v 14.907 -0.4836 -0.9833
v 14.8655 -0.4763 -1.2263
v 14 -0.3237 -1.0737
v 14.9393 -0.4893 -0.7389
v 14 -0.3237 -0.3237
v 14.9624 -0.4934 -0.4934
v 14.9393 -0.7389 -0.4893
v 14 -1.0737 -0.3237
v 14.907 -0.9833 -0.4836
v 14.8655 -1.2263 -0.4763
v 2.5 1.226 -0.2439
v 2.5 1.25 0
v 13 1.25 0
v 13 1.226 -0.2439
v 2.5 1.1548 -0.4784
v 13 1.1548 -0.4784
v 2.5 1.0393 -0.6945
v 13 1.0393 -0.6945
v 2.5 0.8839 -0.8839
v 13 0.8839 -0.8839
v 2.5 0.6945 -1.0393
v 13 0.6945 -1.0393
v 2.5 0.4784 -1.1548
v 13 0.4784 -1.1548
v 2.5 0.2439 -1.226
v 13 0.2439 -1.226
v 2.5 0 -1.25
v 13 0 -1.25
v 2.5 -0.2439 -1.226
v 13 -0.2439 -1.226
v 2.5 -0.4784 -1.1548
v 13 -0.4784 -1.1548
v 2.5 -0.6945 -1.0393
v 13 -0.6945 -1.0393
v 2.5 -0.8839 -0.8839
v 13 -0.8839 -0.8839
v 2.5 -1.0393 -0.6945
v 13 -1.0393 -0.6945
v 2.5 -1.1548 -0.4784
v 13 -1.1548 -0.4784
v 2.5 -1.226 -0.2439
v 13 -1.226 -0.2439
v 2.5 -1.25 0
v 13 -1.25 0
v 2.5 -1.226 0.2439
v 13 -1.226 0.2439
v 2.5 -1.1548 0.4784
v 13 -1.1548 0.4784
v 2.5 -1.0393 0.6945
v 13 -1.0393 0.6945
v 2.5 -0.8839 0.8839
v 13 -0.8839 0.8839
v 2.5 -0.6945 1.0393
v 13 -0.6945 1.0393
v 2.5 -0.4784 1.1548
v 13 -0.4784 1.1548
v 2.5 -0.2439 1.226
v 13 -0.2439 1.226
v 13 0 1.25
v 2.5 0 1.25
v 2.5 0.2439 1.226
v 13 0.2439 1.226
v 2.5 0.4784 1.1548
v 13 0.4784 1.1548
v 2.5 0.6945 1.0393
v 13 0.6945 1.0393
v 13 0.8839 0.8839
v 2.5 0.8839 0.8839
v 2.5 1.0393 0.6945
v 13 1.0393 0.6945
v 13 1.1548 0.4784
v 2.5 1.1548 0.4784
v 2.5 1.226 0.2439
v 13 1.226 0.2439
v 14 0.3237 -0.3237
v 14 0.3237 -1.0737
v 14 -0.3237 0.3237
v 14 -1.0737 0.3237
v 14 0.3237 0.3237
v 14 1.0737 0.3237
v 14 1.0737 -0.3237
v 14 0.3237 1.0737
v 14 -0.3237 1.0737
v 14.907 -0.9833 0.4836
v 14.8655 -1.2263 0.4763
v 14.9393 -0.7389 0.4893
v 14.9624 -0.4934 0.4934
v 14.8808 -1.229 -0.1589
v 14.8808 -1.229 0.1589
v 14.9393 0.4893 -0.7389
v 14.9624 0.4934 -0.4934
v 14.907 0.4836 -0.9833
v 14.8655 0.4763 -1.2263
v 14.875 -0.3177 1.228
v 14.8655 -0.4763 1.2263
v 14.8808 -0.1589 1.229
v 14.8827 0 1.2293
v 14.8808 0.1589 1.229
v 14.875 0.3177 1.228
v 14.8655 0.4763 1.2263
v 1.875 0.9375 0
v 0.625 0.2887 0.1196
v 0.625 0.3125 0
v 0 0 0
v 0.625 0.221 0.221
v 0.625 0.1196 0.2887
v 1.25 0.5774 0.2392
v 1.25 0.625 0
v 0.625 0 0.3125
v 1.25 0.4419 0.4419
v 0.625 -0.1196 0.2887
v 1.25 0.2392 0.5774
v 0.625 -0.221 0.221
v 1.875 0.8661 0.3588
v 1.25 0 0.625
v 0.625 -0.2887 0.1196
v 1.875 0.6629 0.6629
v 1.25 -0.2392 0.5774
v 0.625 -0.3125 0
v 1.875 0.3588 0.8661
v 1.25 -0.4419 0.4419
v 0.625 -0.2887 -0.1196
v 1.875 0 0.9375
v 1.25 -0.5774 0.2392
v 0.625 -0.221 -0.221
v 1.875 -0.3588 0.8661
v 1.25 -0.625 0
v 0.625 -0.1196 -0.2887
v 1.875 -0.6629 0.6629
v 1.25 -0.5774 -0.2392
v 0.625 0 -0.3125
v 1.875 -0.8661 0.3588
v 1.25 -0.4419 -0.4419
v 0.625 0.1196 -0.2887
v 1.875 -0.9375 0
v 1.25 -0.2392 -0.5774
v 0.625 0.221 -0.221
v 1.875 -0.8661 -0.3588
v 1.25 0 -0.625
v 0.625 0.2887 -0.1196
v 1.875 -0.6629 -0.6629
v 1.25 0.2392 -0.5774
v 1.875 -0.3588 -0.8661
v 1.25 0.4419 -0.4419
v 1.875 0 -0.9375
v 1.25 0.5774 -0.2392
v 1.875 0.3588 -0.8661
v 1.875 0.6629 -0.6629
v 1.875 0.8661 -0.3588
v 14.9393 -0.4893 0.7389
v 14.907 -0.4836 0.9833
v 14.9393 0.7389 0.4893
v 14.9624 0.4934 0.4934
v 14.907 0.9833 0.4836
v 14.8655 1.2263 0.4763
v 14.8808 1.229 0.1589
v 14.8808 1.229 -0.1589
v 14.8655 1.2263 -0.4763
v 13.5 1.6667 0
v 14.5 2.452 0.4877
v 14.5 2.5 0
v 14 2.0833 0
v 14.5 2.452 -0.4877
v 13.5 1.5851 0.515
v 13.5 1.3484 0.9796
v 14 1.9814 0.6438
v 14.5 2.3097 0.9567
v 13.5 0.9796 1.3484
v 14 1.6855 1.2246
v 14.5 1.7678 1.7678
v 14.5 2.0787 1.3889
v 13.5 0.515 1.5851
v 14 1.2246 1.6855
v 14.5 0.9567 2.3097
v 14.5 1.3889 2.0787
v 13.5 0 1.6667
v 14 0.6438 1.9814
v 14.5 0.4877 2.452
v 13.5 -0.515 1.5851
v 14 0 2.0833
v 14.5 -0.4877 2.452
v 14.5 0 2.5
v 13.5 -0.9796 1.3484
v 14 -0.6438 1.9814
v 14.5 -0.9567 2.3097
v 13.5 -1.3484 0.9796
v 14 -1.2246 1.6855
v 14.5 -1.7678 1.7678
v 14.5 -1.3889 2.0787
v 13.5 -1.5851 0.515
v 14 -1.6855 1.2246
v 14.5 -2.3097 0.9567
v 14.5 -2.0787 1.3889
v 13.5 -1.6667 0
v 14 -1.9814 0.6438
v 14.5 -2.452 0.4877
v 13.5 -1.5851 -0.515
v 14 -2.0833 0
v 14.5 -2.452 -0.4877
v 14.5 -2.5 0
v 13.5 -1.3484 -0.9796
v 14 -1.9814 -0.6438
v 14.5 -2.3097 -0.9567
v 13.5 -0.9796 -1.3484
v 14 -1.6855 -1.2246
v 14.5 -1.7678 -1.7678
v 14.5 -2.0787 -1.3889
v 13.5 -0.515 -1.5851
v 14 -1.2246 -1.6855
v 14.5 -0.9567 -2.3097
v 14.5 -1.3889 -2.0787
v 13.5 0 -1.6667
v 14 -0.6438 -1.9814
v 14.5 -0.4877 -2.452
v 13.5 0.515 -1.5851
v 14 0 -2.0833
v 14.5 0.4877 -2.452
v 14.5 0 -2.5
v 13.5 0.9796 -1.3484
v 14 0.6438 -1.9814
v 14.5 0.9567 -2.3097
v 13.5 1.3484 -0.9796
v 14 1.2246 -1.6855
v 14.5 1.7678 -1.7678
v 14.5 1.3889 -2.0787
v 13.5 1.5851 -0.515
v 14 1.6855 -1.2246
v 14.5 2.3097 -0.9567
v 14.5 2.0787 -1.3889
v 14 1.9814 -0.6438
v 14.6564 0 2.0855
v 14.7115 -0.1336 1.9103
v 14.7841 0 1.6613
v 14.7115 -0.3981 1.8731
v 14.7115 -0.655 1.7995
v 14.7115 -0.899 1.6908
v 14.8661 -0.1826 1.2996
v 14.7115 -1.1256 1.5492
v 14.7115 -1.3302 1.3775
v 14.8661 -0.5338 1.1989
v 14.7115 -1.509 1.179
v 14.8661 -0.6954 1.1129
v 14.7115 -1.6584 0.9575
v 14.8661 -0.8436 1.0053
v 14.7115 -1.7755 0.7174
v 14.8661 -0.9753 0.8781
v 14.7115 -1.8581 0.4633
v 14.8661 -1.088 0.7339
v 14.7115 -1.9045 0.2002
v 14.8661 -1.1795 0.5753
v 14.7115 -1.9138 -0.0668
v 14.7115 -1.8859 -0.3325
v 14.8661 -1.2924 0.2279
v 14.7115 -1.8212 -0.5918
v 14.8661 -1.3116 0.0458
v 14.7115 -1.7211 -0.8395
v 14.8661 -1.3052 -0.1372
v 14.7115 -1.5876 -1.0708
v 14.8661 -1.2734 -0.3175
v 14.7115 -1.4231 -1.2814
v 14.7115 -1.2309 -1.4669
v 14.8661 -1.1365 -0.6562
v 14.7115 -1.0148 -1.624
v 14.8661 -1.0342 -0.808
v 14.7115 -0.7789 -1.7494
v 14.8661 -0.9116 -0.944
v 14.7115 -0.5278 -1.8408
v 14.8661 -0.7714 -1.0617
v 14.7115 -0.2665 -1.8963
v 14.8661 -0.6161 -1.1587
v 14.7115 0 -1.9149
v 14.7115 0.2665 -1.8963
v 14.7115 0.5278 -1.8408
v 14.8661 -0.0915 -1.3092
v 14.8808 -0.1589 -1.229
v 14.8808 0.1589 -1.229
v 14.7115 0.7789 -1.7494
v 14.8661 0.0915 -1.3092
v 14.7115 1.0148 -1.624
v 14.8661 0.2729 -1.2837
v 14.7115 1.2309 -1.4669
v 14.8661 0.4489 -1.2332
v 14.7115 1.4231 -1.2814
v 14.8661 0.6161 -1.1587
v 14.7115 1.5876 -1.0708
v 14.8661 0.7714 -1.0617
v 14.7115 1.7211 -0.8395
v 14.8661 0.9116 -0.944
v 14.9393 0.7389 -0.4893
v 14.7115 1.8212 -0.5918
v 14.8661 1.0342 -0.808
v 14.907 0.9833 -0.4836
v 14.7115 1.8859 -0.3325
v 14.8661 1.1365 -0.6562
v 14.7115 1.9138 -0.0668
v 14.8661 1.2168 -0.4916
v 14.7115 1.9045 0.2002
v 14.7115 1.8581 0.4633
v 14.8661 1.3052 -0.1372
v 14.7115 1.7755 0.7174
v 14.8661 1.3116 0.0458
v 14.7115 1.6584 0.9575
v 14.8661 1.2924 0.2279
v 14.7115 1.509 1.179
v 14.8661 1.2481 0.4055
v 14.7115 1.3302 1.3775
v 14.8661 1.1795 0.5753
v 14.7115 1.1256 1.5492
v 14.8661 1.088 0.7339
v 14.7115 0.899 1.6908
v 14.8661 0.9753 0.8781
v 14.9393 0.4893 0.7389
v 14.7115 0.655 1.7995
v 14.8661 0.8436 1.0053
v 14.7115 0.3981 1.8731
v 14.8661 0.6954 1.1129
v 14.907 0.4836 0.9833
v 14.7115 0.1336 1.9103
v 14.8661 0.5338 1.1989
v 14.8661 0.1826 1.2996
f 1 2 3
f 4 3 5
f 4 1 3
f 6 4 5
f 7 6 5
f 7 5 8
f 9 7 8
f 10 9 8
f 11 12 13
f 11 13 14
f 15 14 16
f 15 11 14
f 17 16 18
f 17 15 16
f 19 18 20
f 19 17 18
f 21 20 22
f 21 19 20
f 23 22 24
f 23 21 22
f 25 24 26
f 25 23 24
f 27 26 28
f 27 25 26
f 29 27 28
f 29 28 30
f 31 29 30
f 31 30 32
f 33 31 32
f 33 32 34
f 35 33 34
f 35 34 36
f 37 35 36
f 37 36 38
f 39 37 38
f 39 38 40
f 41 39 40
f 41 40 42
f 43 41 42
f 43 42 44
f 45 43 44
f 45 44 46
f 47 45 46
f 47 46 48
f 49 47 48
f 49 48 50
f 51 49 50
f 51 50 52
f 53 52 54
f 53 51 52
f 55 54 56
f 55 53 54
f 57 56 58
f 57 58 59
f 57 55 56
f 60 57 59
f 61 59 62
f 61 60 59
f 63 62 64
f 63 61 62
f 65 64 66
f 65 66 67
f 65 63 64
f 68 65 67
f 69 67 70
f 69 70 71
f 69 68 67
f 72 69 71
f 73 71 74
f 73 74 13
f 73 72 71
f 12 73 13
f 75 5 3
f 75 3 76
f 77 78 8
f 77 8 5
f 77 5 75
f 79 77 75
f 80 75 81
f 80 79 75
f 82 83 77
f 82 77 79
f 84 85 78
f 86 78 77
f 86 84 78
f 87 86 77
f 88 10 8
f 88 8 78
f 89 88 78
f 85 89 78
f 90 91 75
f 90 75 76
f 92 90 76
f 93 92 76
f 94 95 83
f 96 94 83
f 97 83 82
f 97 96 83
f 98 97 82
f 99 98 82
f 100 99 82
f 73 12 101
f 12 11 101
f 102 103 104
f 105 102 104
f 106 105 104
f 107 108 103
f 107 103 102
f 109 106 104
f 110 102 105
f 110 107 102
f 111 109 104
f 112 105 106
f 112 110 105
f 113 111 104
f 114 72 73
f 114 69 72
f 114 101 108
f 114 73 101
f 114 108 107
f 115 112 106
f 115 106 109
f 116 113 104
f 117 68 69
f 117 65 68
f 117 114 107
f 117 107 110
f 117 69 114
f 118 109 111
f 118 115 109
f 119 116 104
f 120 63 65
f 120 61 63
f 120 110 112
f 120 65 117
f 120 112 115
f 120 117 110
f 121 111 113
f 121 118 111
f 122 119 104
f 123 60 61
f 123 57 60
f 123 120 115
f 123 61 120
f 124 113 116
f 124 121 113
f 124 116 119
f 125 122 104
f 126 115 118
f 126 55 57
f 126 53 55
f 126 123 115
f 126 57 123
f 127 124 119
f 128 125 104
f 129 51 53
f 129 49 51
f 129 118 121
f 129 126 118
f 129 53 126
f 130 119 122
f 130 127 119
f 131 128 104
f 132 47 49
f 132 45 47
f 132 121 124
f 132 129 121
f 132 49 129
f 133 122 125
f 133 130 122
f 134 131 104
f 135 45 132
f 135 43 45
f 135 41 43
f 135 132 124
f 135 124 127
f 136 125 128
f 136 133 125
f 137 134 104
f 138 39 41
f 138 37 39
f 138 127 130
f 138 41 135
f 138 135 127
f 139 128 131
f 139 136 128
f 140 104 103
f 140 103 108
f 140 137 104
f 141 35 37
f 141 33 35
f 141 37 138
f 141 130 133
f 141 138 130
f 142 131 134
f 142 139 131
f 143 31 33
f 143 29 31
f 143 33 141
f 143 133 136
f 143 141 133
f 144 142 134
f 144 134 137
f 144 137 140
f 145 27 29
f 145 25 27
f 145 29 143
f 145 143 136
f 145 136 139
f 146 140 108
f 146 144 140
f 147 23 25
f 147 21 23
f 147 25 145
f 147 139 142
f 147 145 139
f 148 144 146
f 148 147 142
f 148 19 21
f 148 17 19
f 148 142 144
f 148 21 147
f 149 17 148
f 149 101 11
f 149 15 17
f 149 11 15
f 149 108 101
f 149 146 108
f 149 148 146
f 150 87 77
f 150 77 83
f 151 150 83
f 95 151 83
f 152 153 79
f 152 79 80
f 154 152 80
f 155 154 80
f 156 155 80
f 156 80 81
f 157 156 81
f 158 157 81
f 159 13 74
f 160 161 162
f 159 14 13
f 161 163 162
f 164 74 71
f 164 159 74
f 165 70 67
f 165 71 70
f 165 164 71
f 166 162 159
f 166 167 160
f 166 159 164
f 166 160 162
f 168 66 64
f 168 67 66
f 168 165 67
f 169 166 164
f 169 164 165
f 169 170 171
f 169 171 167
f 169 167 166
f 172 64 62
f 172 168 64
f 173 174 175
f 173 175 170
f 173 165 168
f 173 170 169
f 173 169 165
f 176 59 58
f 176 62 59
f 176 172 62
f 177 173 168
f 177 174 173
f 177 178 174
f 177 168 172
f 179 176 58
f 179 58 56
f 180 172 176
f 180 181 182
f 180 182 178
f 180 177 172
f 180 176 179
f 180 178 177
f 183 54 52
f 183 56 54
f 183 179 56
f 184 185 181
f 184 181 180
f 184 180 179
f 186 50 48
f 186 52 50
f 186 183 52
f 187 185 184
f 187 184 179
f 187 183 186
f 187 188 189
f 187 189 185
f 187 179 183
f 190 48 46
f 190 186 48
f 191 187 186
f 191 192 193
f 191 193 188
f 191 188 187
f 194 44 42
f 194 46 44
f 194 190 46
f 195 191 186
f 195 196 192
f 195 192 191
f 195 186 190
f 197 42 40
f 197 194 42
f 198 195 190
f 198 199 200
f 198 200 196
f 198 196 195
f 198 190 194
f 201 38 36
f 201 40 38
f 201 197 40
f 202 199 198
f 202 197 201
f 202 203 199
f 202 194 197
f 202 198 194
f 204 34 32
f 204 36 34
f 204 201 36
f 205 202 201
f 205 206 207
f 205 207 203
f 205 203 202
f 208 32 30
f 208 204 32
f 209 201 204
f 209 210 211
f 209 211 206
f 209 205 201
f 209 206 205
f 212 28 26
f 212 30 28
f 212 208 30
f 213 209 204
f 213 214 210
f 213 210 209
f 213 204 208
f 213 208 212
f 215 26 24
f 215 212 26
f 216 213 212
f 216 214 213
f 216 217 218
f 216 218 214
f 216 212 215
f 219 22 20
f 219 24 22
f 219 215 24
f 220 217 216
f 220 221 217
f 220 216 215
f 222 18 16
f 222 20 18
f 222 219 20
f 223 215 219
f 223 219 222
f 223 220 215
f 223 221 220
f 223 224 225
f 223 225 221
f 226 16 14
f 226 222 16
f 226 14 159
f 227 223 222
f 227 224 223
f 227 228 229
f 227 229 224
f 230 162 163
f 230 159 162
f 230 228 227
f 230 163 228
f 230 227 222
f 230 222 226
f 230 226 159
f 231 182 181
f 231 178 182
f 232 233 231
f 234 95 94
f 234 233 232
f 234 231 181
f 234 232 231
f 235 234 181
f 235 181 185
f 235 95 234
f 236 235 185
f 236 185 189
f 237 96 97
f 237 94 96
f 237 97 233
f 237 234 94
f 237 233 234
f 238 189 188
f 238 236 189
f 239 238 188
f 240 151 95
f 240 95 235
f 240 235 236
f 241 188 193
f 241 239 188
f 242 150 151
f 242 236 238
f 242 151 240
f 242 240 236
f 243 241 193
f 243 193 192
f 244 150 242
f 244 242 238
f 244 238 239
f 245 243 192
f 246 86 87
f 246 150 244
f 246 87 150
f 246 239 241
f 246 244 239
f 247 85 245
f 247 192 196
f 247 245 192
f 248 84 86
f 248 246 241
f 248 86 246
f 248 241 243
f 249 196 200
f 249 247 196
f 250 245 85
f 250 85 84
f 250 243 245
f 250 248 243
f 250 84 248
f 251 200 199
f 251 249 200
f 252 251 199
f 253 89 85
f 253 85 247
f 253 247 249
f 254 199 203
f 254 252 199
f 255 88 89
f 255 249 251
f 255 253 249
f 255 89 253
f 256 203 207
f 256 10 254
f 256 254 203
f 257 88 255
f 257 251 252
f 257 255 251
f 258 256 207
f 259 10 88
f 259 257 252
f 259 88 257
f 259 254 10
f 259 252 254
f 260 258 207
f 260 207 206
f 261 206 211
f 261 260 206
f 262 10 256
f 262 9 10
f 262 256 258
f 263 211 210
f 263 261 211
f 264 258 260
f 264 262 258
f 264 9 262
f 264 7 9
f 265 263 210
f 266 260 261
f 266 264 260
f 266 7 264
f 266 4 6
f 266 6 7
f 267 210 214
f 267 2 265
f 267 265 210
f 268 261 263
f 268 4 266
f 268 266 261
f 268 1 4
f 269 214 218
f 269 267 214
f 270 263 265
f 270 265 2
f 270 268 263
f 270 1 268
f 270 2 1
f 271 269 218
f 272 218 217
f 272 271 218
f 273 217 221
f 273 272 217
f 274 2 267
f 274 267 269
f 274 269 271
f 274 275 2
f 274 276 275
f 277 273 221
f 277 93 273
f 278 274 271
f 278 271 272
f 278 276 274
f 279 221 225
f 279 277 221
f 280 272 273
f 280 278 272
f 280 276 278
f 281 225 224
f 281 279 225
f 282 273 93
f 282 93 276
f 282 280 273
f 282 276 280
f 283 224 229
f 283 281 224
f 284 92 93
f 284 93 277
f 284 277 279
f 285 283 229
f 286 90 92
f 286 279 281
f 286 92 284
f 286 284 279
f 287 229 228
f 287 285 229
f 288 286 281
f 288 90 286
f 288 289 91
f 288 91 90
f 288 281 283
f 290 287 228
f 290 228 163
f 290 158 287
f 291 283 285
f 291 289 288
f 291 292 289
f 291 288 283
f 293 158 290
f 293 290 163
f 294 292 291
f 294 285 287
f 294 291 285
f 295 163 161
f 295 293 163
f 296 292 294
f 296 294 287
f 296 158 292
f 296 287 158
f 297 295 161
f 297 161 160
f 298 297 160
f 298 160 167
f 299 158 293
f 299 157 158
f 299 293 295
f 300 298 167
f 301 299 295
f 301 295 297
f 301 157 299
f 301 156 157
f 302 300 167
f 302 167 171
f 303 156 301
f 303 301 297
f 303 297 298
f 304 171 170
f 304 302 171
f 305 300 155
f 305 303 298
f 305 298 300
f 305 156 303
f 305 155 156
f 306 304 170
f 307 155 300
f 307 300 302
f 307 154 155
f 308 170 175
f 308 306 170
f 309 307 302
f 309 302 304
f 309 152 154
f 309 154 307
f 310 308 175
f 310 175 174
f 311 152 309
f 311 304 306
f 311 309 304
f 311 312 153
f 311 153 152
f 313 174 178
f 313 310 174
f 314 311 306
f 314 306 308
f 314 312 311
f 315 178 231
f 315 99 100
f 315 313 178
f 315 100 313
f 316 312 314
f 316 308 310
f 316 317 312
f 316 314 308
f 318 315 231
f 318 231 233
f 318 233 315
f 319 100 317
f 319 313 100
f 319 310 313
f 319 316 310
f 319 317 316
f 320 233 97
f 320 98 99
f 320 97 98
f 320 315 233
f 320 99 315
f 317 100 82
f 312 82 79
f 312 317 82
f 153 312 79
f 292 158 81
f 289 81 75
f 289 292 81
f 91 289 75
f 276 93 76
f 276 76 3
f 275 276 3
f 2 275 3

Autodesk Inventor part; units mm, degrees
ref_plane "XZ Plane" through (0, 0, 0) normal (0, 1, 0) x (-1, 0, 0)
sketch "Sketch1" plane through (0, 0, 0) normal (1, 0, 0) x (0, 1, 0)
  circle A0 centre (0, 0) radius 1.25
  dimension "d0" = 2.5
extrude "Extrusion1" add sketch "Sketch1" along normal blind 13
thread "Thread1" size "M2.5x0.45" class "6g" standard "ANSI Metric M Profile" full length
chamfer "Chamfer1" distance 1.25 distance2 2.5 1 edges at (0, -1.25, 0) measured on face at (0, -0.1478, -0.3896)
ref_plane "Work Plane1" through (14.5, 0, 0) normal (1, 0, 0) x (0, 0, -1)
sketch "Sketch2" plane through (14.5, 0, 0) normal (1, 0, 0) x (0, 0, -1)
  circle A0 centre (0, 0) radius 2.5
  dimension "d11" = 5
loft "Loft1" add profiles "Sketch2" section 1 edges at (13, -1.25, 0)
sketch "Sketch3" plane through (0, 0, 0) normal (0, 1, 0) x (-1, 0, 0)
  line L0 (-14.5, -2.5) -> (-14.5, 2.5) construction
  line L1 (-14.5, 0) -> (-15, 0)
  arc A0 (-14.5, 2.5) -> (-15, 0) centre (-8.5, 0) ccw
  line L2 (-14.5, 2.5) -> (-14.5, 0)
  line L3 (3.0248, 0) -> (-18.1485, 0) projected
  point P0 (0, 0)
  dimension "d16" = 0.5
revolve "Revolution1" add sketch "Sketch3" angle 360 about axis through (-10, 0, 0) along (1, 0, 0)
ref_plane "Work Plane2" through (15, 0, 0) normal (1, 0, 0) x (0, 1, 0)
sketch "Sketch4" plane through (15, 0, 0) normal (1, 0, 0) x (0, 1, 0)
  line L0 (1.25, 0.5) -> (1.25, -0.5)
  line L1 (-1.25, -0.5) -> (-1.25, 0.5)
  line L2 (0.5, -1.25) -> (-0.5, -1.25)
  line L3 (-0.5, 1.25) -> (0.5, 1.25)
  line L4 (-0.5, -1.25) -> (-0.5, -0.5)
  line L5 (-0.5, 0.5) -> (-0.5, 1.25)
  line L6 (1.25, -0.5) -> (0.5, -0.5)
  line L7 (-0.5, -0.5) -> (-1.25, -0.5)
  line L8 (0.5, 1.25) -> (0.5, 0.5)
  line L9 (0.5, -0.5) -> (0.5, -1.25)
  line L10 (-1.25, 0.5) -> (-0.5, 0.5)
  line L11 (0.5, 0.5) -> (1.25, 0.5)
  dimension "d18" = 2.5
  dimension "d19" = 1
  dimension "d20" = 1
  dimension "d21" = 2.5
extrude "Extrusion2" cut sketch "Sketch4" against normal blind 1 draft -10
properties part number "Parafuso do Plug P10"
